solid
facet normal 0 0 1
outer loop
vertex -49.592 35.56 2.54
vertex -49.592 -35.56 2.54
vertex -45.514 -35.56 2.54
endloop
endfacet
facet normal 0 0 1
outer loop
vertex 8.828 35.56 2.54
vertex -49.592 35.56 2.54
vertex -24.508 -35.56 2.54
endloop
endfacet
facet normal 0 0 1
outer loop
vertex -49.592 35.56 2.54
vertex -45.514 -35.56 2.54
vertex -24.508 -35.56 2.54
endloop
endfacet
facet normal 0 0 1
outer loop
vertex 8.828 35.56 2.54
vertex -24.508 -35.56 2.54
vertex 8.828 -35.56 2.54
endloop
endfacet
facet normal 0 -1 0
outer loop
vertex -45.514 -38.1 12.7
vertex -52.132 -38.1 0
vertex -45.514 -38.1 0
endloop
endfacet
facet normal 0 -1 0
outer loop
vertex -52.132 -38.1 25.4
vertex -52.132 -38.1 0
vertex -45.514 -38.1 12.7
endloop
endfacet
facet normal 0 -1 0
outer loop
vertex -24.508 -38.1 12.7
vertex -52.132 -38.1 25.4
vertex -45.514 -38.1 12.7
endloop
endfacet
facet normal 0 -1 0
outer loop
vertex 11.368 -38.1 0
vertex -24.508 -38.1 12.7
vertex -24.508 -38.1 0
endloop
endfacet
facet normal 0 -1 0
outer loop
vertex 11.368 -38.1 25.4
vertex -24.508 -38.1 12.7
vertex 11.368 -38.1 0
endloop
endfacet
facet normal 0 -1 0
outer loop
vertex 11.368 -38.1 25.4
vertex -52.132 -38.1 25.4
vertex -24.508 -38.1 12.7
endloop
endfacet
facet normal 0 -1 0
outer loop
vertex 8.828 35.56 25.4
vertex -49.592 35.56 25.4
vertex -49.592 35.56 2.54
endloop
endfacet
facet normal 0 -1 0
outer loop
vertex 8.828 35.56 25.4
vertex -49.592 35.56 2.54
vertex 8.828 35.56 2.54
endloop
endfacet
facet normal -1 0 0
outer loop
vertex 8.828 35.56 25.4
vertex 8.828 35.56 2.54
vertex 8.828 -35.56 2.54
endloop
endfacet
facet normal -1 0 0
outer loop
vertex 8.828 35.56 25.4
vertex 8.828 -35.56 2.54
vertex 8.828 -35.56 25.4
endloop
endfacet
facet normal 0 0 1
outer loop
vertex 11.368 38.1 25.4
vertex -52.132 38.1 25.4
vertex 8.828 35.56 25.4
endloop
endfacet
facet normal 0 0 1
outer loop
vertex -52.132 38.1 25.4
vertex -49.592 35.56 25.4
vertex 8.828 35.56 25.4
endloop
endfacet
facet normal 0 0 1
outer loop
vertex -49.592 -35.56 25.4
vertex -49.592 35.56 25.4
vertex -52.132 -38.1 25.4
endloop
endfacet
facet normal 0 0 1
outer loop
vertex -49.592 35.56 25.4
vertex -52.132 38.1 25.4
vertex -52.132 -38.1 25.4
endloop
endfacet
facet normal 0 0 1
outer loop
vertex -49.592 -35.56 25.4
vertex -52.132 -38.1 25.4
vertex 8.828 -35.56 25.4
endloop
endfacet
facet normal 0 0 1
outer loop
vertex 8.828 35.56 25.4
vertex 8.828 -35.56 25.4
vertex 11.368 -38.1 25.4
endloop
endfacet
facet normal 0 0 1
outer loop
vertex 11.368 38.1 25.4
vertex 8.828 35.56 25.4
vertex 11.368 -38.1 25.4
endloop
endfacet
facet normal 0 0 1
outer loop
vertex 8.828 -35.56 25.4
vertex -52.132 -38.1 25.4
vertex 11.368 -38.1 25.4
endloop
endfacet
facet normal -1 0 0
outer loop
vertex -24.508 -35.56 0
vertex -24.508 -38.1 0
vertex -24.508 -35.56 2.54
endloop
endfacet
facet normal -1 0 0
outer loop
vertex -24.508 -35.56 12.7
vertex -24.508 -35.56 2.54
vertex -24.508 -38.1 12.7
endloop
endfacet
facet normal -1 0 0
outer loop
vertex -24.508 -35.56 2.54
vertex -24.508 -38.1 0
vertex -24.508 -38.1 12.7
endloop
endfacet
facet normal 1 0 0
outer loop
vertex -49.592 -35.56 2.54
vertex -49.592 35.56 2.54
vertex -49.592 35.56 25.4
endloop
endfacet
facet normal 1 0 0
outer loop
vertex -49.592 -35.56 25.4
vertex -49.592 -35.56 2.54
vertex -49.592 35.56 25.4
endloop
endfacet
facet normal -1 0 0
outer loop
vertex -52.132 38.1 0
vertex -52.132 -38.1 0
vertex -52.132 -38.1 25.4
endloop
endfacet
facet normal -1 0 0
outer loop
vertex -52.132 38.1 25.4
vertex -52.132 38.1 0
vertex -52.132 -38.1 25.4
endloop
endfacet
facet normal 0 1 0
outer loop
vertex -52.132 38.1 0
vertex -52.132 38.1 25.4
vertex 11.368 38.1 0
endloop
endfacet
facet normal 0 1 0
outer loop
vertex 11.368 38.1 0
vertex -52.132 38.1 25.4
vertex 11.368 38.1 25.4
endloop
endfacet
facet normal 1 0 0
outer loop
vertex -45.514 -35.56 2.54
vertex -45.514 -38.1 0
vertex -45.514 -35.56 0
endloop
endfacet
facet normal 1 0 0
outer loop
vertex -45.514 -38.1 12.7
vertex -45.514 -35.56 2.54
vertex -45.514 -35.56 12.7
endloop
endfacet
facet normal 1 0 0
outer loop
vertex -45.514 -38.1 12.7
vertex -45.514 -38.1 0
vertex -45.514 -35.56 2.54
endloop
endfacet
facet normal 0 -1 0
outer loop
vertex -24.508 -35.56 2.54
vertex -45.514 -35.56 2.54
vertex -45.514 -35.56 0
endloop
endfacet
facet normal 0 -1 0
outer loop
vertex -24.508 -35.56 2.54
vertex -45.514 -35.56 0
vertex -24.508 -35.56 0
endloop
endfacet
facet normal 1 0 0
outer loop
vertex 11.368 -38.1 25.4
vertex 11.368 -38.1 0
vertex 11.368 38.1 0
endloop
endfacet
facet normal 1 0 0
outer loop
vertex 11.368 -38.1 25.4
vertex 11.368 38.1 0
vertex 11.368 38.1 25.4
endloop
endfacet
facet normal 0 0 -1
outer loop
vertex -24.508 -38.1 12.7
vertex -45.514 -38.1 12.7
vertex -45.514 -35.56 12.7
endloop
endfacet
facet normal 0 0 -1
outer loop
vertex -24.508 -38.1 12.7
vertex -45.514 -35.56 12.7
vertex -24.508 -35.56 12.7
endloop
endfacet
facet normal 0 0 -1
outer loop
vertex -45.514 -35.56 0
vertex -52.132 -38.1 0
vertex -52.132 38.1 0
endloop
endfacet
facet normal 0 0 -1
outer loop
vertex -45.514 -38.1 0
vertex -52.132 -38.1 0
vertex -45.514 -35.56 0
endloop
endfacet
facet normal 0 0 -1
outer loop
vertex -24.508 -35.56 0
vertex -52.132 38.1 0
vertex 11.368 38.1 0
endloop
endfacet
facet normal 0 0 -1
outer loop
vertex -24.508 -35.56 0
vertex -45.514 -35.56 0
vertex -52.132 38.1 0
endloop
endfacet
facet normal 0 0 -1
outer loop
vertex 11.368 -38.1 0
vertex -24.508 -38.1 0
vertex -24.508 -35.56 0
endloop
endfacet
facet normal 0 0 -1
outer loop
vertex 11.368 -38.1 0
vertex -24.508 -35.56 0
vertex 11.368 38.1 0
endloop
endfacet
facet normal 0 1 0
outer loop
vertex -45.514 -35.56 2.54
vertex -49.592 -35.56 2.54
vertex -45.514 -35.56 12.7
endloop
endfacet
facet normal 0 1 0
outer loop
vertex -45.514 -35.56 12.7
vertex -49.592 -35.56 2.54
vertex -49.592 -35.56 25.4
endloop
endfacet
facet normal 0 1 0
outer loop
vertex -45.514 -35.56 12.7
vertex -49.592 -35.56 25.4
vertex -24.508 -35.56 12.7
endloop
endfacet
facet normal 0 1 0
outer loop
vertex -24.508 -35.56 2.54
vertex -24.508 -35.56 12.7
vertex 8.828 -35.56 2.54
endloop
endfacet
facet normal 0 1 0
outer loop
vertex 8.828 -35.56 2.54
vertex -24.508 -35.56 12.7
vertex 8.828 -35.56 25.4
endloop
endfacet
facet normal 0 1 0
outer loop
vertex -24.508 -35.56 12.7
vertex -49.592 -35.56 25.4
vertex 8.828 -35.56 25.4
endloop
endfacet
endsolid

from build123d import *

# Parameters (mm, degrees)
F0_W     = 63.5
F0_H     = 25.4
F1_DEPTH = 38.1
F2_T     = -2.54
F3_W     = 21.006488
F3_H     = 12.7
F4_DEPTH = 2.54


with BuildPart() as f1:
    # F0 (on Front) → F1 (new body, symmetric)
    with BuildSketch(Plane.XZ):
        with Locations((-20.382458, 12.7)):
            Rectangle(F0_W, F0_H)
    extrude(amount=F1_DEPTH, both=True)

    # F2
    f2_openings = [f1.faces().sort_by_distance(p)[0] for p in [
        (-20.382458, 0, 25.4),
    ]]
    offset(amount=F2_T, openings=f2_openings)

    # F3 (on face) → F4 (cut)
    with BuildSketch(Plane.XZ.offset(38.1)):
        with Locations((-35.010811, 6.35)):
            Rectangle(F3_W, F3_H)
    extrude(amount=-F4_DEPTH, mode=Mode.SUBTRACT)


solid = f1.part
